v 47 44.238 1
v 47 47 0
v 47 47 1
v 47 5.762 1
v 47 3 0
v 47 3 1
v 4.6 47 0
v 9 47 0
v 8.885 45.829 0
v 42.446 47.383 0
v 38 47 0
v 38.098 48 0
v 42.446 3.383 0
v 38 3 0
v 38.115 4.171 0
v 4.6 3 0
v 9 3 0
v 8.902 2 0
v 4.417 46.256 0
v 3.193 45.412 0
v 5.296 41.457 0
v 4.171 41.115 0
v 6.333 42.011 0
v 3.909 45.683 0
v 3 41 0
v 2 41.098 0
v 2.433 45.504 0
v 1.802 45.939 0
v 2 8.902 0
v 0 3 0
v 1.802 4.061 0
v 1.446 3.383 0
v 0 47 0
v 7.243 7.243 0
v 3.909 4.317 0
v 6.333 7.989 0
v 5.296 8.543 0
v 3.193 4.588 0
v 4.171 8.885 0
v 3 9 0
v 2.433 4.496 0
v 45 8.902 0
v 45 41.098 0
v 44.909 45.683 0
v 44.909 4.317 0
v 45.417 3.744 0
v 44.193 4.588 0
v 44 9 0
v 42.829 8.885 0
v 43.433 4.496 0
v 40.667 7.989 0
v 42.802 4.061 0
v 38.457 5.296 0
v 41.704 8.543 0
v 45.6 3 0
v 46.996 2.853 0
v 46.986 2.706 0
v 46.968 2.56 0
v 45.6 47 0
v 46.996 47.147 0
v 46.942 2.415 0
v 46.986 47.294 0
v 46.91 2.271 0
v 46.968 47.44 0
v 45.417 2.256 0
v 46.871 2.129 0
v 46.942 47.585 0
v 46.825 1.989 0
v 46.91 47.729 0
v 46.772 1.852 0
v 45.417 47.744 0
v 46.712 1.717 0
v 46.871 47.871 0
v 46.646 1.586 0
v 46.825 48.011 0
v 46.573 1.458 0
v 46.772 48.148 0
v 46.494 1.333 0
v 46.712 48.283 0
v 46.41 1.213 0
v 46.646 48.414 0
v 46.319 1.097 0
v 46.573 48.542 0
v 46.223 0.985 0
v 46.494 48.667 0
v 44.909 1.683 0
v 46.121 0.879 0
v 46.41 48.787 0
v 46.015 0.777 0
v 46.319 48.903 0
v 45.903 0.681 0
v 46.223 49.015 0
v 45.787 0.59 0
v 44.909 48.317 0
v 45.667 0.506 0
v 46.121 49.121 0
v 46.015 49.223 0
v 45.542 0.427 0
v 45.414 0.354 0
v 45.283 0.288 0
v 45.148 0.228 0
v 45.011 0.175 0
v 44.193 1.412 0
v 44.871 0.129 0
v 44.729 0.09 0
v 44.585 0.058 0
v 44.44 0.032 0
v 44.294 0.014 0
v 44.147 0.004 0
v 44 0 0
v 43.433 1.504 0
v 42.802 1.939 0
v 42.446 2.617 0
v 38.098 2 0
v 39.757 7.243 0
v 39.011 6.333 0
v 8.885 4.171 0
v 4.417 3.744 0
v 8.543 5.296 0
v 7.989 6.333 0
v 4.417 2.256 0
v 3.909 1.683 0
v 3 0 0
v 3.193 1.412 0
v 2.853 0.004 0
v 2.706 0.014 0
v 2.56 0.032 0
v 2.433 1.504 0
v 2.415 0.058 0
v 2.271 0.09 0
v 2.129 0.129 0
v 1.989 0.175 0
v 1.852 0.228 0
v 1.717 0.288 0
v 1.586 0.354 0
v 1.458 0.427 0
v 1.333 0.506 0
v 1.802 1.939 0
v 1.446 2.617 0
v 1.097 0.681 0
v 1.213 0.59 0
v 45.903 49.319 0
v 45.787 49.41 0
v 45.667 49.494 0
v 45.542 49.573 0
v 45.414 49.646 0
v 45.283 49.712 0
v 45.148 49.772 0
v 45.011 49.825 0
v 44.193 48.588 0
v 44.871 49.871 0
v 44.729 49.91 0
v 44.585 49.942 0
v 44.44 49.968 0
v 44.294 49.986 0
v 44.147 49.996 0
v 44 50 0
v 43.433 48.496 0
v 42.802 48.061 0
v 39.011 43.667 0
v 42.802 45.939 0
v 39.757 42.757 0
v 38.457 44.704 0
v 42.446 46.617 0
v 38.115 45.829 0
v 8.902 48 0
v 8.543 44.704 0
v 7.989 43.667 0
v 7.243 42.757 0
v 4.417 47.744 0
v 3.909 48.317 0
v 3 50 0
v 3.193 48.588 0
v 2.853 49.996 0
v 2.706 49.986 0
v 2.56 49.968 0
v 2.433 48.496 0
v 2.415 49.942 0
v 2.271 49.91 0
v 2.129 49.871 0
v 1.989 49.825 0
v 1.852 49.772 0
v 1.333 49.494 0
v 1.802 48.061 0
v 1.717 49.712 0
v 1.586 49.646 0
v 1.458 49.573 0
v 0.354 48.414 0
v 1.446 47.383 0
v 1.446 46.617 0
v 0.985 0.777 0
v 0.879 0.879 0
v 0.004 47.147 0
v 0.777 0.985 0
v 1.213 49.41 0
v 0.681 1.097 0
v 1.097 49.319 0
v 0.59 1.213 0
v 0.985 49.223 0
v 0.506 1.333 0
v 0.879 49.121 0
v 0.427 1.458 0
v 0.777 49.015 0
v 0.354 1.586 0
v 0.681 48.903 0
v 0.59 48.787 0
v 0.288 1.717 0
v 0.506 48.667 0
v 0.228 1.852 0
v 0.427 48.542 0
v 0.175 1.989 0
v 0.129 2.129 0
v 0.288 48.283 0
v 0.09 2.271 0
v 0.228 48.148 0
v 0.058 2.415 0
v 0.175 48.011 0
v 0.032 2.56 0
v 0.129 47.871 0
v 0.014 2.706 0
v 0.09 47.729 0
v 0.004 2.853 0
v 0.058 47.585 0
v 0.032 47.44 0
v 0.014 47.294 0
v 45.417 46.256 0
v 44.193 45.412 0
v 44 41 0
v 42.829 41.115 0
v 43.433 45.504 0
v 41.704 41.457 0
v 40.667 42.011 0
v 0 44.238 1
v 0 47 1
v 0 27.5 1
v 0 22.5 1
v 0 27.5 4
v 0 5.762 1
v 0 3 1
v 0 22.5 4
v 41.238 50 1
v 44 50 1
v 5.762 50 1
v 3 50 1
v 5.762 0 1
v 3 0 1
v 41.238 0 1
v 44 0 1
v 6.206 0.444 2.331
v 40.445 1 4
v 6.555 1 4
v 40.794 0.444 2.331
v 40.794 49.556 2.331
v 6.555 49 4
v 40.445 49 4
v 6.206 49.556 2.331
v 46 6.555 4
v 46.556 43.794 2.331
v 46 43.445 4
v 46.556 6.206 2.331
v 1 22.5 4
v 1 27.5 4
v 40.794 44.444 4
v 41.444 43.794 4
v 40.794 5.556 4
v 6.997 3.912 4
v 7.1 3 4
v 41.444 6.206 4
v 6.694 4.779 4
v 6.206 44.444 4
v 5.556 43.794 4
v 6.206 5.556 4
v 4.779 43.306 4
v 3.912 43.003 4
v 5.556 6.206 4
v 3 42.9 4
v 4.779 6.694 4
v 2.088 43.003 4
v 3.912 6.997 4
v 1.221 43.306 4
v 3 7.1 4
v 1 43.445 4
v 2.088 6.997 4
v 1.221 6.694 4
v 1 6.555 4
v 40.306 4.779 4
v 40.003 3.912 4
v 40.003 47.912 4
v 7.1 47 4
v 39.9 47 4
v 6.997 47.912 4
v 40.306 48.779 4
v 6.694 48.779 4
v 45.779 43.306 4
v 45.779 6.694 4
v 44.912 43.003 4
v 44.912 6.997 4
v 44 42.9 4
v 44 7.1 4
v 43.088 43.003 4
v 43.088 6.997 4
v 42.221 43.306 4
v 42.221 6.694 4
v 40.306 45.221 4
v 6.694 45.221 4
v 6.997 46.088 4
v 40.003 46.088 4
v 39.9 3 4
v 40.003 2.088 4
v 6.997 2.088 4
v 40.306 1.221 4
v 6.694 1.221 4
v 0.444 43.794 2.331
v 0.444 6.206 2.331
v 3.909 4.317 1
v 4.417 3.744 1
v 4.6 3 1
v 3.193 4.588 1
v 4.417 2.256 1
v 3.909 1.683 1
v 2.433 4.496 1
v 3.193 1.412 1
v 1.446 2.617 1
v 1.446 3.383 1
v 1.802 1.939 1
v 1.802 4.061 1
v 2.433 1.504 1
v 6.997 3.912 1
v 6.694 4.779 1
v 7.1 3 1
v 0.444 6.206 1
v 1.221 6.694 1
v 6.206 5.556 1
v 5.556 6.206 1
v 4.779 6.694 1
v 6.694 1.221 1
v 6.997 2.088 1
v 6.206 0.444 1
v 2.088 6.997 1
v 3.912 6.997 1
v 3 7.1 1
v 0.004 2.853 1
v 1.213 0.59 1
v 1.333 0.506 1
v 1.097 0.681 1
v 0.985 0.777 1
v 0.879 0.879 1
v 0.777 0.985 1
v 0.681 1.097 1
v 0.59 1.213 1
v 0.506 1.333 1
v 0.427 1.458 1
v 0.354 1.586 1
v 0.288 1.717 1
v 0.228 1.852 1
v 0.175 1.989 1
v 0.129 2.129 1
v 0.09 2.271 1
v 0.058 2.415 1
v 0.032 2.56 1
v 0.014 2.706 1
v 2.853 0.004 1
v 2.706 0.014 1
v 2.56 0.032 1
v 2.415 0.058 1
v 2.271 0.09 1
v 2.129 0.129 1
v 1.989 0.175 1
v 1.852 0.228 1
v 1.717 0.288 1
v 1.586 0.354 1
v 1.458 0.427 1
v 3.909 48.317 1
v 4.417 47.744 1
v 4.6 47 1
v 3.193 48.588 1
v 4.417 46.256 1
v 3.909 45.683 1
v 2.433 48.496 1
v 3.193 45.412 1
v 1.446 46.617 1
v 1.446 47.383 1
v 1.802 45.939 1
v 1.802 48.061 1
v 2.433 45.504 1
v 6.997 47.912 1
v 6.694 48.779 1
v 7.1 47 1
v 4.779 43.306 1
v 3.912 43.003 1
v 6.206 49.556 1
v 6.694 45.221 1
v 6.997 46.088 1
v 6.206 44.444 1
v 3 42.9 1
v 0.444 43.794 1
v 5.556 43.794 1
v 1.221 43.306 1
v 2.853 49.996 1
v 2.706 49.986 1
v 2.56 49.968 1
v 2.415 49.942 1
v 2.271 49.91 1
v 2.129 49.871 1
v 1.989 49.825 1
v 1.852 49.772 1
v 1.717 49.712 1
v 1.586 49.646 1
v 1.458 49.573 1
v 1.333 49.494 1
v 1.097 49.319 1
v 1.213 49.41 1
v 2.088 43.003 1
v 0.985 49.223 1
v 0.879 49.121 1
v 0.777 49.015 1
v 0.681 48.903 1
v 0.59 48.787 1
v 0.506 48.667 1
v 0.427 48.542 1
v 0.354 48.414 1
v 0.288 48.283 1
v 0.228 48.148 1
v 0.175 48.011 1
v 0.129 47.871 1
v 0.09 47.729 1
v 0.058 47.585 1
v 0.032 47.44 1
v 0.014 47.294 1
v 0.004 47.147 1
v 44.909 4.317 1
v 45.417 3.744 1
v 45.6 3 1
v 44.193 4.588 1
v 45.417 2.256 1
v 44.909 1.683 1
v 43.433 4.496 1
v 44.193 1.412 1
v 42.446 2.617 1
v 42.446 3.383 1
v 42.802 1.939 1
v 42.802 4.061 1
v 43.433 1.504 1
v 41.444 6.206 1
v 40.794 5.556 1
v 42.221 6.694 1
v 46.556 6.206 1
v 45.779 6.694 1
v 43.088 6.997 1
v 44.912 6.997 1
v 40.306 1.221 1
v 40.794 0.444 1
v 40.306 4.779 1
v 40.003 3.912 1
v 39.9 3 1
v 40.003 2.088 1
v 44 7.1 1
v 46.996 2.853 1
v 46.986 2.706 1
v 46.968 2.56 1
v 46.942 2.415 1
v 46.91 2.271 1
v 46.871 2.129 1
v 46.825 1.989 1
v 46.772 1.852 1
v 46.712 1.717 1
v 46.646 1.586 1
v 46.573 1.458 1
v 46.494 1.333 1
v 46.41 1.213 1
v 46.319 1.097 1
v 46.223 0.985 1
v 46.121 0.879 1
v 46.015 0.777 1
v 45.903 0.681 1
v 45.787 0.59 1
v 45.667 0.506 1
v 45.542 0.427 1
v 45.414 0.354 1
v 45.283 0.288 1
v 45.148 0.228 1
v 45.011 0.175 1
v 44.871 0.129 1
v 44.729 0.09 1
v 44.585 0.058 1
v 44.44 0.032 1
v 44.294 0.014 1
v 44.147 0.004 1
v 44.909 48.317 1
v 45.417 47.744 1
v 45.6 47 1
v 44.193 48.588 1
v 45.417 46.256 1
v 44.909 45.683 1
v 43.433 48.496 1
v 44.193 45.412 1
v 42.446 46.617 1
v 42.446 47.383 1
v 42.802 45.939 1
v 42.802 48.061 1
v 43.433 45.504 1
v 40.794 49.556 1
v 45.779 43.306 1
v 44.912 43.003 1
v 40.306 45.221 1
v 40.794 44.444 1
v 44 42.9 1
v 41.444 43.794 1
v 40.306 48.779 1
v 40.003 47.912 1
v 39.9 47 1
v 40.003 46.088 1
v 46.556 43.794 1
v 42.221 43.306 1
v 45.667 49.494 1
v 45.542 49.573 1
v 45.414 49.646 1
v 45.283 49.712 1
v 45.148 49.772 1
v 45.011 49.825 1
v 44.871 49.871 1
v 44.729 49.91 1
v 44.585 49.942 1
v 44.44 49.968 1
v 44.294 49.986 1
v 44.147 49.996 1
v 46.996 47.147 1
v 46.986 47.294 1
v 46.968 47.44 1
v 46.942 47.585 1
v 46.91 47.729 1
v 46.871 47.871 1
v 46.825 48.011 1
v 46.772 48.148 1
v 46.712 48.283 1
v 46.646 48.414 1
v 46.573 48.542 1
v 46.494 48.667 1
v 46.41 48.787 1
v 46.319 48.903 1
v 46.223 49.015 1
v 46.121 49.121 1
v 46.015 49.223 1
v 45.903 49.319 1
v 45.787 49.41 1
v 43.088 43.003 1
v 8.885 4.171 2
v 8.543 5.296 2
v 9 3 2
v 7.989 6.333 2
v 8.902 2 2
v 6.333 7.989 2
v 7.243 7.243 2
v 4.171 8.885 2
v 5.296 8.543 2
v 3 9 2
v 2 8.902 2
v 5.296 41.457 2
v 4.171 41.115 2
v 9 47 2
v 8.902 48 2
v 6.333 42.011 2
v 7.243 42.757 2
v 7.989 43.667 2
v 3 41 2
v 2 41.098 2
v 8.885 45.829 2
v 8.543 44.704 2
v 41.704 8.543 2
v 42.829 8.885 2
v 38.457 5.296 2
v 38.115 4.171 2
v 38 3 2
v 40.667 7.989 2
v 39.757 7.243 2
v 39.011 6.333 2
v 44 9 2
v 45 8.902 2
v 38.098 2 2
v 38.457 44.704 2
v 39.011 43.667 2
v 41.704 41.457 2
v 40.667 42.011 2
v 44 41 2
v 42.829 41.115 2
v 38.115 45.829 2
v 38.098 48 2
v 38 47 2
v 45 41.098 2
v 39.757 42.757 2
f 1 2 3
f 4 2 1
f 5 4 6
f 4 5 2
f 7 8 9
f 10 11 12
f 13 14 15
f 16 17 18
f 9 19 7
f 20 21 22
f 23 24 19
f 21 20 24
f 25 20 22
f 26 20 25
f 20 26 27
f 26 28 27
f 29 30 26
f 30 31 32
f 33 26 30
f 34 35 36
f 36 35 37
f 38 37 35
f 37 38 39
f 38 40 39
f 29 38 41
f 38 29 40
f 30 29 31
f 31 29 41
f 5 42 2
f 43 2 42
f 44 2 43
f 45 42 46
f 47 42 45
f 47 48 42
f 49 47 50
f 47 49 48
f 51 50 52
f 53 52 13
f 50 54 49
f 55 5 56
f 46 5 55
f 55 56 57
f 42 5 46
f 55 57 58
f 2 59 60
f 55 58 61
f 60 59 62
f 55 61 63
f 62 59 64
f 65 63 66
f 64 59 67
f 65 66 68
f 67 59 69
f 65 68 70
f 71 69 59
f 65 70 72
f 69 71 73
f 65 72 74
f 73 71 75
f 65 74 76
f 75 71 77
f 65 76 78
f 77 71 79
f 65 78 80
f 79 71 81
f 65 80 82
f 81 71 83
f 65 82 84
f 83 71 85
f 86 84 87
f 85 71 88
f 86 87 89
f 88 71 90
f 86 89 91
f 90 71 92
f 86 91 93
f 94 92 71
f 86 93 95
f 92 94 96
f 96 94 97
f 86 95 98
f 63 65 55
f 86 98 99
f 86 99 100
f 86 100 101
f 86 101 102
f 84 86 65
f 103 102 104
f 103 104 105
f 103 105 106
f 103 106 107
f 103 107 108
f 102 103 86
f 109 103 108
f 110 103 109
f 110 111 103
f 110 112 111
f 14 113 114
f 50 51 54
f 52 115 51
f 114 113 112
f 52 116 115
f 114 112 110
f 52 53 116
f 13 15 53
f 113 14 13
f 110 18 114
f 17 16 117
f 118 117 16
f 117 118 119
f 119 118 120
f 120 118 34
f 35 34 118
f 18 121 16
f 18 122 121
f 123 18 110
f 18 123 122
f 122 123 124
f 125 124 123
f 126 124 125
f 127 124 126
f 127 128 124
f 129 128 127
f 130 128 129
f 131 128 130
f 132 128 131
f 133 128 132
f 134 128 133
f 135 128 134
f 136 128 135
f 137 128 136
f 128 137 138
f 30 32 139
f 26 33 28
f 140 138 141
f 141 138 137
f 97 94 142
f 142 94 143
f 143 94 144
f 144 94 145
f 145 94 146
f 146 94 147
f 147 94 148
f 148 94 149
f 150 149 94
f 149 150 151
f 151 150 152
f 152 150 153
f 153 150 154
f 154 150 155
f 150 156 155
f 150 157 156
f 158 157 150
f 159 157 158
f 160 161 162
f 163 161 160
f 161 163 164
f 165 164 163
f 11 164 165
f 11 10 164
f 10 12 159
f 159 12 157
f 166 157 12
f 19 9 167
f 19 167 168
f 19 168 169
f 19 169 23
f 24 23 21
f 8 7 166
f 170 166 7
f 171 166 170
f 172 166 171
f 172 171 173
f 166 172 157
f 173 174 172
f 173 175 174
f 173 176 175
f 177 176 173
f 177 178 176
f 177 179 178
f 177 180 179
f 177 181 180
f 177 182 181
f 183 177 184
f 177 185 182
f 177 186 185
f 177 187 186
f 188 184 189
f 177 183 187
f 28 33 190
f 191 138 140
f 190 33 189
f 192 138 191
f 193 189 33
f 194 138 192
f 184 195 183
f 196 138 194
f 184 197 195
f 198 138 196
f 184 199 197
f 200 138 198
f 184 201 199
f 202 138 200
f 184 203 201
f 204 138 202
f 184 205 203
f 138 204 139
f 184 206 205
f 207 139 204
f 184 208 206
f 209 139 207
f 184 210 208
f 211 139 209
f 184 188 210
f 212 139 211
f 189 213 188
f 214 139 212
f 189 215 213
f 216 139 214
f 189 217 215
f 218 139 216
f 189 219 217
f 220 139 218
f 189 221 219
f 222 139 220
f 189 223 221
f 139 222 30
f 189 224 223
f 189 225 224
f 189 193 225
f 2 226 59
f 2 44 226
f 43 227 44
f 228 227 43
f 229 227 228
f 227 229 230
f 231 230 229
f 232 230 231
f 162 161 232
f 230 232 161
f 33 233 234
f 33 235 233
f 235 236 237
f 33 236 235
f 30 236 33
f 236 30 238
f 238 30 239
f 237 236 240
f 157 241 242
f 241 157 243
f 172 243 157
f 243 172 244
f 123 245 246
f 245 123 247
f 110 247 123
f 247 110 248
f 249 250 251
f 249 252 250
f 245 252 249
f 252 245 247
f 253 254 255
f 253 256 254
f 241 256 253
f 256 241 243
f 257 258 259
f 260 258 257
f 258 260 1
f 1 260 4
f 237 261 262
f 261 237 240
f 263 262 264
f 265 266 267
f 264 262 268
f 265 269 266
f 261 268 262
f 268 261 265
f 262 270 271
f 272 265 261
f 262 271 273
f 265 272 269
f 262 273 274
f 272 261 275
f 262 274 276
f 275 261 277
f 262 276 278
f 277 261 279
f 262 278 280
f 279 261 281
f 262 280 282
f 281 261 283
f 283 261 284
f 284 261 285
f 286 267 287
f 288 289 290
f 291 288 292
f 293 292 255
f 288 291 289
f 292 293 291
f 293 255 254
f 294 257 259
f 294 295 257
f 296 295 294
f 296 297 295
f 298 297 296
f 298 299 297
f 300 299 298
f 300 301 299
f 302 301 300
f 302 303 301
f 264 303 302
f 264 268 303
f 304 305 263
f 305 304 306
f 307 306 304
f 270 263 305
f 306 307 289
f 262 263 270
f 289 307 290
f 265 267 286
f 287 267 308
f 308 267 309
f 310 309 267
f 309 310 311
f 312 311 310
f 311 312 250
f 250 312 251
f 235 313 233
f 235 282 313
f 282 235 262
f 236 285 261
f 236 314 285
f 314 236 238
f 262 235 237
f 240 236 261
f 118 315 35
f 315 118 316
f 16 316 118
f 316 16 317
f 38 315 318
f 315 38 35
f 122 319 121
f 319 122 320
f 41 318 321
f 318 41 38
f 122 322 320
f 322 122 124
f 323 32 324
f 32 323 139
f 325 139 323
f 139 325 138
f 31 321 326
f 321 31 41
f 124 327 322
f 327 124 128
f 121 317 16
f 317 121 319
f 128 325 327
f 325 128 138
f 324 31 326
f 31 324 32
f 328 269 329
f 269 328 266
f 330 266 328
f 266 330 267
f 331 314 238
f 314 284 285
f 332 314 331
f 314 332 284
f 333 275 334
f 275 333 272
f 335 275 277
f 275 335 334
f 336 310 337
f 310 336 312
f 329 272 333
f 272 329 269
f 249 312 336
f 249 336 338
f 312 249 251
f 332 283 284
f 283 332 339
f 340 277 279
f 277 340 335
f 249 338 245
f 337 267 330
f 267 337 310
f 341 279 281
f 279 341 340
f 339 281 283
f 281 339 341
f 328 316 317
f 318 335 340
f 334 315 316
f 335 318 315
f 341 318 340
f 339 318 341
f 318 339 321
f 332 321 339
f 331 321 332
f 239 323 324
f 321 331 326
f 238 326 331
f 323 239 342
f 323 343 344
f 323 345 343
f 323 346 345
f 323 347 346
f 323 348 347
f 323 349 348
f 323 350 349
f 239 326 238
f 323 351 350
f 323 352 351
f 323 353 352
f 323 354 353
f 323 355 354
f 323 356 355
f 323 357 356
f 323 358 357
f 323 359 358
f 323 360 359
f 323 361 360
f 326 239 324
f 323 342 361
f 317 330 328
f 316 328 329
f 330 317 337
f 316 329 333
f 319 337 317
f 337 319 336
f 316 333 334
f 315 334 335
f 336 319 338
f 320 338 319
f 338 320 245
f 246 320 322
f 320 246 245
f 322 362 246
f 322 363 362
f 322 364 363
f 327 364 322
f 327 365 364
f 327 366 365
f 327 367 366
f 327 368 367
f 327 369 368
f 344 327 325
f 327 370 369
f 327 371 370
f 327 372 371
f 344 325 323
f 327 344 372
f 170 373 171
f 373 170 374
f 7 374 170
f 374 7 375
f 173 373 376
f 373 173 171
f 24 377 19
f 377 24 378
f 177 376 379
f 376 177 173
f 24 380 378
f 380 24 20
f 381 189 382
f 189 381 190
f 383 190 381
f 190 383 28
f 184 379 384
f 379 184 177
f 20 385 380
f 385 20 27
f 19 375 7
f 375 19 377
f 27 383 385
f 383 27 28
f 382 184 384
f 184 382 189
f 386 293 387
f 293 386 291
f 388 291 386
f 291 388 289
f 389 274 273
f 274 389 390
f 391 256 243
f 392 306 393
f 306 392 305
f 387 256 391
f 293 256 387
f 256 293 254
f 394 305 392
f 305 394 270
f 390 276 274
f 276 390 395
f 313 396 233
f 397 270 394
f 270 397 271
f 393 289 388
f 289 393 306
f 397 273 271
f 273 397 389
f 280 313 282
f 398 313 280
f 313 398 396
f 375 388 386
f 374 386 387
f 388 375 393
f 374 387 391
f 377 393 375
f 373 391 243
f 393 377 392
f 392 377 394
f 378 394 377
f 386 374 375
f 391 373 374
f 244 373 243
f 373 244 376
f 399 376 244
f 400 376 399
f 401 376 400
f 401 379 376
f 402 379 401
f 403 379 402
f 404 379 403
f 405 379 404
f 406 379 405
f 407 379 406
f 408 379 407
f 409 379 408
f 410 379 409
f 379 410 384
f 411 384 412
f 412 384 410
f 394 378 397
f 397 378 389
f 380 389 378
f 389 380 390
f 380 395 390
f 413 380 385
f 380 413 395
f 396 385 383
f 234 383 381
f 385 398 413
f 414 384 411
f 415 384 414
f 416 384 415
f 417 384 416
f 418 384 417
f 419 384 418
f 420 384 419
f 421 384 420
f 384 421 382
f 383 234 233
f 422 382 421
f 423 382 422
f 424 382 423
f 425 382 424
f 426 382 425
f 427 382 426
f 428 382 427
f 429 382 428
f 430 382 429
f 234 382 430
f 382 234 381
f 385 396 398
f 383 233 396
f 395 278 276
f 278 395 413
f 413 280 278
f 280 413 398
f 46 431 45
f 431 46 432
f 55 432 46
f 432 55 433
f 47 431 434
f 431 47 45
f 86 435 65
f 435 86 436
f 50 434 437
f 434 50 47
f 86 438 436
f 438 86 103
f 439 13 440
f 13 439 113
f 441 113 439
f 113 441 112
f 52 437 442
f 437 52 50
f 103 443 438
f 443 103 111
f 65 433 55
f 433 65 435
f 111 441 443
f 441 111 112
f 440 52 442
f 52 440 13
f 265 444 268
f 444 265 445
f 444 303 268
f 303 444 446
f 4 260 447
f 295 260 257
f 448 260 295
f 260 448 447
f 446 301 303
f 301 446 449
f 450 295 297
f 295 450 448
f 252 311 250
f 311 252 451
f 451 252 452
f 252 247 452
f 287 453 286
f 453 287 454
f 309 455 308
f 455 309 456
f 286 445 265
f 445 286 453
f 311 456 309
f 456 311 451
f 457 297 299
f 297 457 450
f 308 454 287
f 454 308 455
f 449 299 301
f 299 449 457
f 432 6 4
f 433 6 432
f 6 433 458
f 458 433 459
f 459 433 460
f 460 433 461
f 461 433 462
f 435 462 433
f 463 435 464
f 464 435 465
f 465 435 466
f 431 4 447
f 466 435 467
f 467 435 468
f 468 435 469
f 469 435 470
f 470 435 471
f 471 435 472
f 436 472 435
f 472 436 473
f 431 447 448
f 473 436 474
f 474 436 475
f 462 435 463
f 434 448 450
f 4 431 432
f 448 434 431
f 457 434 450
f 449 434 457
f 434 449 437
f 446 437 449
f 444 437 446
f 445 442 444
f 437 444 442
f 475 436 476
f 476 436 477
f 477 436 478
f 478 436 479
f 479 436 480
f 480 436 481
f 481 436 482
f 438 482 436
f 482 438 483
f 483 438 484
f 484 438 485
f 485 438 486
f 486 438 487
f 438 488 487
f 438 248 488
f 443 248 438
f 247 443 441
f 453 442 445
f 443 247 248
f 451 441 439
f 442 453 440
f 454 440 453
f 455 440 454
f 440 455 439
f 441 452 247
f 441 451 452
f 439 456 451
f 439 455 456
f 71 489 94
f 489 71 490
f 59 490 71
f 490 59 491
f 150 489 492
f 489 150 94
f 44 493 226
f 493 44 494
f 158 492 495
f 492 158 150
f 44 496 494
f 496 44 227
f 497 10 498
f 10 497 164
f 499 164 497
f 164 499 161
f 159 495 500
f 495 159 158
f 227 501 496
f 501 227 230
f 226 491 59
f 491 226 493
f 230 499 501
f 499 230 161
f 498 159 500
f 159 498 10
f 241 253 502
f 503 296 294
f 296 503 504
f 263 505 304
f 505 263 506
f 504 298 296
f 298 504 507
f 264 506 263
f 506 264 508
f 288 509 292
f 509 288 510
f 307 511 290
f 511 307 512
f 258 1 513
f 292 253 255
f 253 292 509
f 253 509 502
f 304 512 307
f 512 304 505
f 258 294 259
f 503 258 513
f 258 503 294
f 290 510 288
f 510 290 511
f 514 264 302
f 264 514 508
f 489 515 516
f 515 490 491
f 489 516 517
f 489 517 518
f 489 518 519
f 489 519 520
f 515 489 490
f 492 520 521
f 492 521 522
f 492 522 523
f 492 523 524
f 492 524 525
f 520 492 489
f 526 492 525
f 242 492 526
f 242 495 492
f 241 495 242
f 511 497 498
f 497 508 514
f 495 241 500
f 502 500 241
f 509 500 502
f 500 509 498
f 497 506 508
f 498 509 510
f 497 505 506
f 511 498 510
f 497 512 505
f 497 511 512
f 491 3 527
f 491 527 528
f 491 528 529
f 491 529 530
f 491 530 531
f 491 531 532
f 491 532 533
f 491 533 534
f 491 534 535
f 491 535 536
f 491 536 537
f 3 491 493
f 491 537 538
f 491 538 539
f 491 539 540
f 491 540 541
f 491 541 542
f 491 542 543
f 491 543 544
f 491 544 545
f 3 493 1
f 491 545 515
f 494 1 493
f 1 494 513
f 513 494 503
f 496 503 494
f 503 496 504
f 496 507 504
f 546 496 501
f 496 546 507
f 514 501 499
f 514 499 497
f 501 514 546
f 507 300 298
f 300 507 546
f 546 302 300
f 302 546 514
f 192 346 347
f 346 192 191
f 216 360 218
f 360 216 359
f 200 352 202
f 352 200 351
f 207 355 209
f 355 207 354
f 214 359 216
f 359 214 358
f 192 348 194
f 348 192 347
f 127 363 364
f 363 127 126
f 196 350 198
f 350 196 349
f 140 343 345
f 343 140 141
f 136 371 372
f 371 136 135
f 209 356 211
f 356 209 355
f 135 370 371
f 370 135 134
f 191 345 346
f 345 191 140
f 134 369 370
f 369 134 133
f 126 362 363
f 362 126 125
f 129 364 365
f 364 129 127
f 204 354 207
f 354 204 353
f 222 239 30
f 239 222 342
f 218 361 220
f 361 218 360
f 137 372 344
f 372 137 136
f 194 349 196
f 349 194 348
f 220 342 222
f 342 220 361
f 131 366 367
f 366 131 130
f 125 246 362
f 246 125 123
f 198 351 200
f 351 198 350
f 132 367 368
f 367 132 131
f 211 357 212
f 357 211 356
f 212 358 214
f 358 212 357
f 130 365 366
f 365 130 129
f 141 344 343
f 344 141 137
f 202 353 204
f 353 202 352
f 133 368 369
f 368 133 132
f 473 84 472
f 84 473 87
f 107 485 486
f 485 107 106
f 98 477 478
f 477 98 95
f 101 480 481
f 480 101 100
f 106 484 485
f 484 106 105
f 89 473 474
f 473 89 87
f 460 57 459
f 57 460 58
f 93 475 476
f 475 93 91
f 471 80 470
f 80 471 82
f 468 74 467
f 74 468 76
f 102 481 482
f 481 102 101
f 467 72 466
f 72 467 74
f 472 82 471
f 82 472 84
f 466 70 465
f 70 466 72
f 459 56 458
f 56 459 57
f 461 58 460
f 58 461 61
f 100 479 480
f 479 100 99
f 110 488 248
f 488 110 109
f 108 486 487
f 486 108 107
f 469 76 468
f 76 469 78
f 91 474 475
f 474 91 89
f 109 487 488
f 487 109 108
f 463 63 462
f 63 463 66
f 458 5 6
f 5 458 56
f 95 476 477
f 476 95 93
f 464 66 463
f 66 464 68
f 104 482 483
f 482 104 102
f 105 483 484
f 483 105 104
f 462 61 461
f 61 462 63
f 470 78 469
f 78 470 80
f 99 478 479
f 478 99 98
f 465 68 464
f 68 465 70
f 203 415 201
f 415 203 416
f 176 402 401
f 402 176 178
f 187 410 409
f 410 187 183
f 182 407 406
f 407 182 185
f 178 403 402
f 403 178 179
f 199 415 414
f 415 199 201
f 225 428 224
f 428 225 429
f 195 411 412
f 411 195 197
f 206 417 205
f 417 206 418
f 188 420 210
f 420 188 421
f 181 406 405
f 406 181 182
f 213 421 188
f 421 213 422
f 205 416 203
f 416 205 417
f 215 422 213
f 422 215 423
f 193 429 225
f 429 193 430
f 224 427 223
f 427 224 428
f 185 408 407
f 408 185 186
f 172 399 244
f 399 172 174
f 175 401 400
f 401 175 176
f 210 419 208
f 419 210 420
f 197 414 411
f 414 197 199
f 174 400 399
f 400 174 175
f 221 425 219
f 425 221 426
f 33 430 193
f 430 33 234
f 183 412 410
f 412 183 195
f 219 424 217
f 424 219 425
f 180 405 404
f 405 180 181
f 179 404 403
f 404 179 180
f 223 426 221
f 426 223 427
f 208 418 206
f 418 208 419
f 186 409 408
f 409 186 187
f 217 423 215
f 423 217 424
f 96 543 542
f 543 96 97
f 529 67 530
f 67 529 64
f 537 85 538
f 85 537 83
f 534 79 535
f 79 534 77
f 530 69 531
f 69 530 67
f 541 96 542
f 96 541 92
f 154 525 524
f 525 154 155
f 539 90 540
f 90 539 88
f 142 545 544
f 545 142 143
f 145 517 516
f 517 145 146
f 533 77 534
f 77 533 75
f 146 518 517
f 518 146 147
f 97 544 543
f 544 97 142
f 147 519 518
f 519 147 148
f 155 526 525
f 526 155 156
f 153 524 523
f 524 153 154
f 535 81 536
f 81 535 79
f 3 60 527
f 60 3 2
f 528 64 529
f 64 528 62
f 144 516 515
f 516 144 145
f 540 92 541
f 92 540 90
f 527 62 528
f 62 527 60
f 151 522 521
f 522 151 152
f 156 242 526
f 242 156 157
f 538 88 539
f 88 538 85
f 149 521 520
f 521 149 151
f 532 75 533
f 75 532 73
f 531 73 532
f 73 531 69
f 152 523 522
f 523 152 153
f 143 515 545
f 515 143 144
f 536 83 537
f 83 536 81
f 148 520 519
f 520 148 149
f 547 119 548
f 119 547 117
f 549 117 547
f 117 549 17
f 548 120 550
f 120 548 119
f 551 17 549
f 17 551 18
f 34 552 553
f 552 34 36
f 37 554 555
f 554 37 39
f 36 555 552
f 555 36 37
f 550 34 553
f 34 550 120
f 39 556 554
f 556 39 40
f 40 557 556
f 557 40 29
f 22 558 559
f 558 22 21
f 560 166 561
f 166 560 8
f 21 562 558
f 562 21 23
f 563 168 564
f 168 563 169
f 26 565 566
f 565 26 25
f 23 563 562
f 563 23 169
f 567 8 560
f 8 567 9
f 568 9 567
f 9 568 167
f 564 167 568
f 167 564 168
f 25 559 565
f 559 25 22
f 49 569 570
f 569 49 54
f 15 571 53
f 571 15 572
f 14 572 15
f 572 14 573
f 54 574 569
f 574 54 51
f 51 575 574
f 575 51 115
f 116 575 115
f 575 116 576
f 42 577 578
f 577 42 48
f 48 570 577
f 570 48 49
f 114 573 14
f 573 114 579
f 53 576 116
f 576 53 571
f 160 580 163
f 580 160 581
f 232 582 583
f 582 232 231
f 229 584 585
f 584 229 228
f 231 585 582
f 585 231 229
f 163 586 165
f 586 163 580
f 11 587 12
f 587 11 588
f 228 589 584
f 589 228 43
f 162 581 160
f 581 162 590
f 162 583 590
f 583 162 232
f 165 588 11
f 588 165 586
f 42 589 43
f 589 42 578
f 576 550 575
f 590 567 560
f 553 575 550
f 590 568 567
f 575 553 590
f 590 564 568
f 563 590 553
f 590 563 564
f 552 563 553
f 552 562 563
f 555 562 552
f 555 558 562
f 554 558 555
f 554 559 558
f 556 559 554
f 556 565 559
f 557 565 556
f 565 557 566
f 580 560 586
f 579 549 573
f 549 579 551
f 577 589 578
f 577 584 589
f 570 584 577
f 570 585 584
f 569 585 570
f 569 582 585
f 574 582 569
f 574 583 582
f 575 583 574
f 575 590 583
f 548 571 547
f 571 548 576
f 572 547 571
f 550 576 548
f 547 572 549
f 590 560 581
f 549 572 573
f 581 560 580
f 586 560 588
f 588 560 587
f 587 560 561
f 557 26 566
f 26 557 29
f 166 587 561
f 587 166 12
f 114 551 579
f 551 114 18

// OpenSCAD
// file: lib/utils.scad
module clearance_hole(d, h=100, clearance=0.2, e=0.1) {
	cylinder(r=(d+clearance)/2, h=h+e, $fn=min(64, 4 + 3*d));
}

module z_fillet(r=5, h=100, e=0.1) {
	difference() {
	translate([0-e, 0-e, 0])
		cube([r+e, r+e, h]);
	translate([r, r, 0-e])
		cylinder(r=r, h=h+e+e, $fn=$fn*4);
	}
}

module hexagonal_prism(d_flat=8, h=10) {
    r = d_flat / sqrt(3); // Circumradius
    cylinder(h=h, r=r, $fn=6);
}

module grip_texture(length, depth, height) {
	n = floor(length/depth); // TODO: number of teeth
	e = 0.1;
	xOffset = (length - depth*n)/2;
	difference() {
		translate([0, 0-e, 0-e])
		cube([length, depth+e, height+e+e]);
		for (i = [0:n]) {
			translate([i*depth*2 - xOffset, depth, 0-e])
			cylinder(r=depth, h=height+e+e, $fn=4);
		}
	}
}

module lanyard_loop(length=30, width=8, height=10, overflow=0, slotDiameter=5) {
	e=0.1;
	wall = (height - slotDiameter)/2;
	assert(wall > 0, "slotDiameter too large for lanyard loop");
	difference() {
		union() {
			translate([0-overflow, 0, 0])
			cube([height+overflow, length, width]);
			translate([0, length, 0])
				z_fillet(height/2, h=width);
		}
		translate([height, 0, 0-e])
		rotate([0, 0, 90])
		z_fillet(height/2);
		translate([height, length, 0-e])
		rotate([0, 0, 180])
		z_fillet(height/2);

		// slot
		slotLength = length - wall*3 - slotDiameter;
		translate([wall, wall, 0-e])
			round_rect(size=[slotDiameter, slotLength, width+e+e], r=slotDiameter/2);
		translate([height/2, length - slotDiameter/2 - wall, 0-e])
		cylinder(r=slotDiameter/2, h=width+e+e);
	}
}

module round_rect(size=[10, 10, 10], r=1) {
	difference() {
		cube(size);
		if (r > 0) {
			for (i = [[0,0,0], [1,0,90], [1,1,180], [0,1,270]]) {
				translate([i[0]*size[0], i[1]*size[1], -.1])
				rotate([0, 0, i[2]])
					z_fillet(r, h=size[2]+0.2);
			}
		}
	}
}

function mounting_bolts(length, width, holeOffset) = [
	[ holeOffset, holeOffset],
	[ holeOffset, width - holeOffset],
	[ length - holeOffset, holeOffset],
	[ length - holeOffset, width - holeOffset]
];

function hexWrenchSize(width) = width / 2 * sqrt(3);
// main file
use <lib/utils.scad>;

module case_cover(
	length=47,
	width=50,
	thickness=4,
	hex=false,
	counterboreDepth=3,
	counterboreDiameter=8) {

	bottomThickness = 1;
	topThickness = 2;
	mountHoleOffset = 3; // must match the value in case_frame
	mountHoleSize = 3;
	draftOffset = 1;
	wallThickness = 2;
	wrenchSize = hexWrenchSize(counterboreDiameter);
	echo("Counterbore size: ", counterboreDiameter, "\n");
	echo("Wrench size: ", wrenchSize, "\n");
	e = 0.1; // small waste number; not for final geometry

	assert(thickness >= (counterboreDepth+bottomThickness), "case_cover thickness is too small");

	difference() {
		union() {
			cube([
				length,
				width,
				bottomThickness
			]);
			translate([0, 0, bottomThickness])
				truncated_pyramid(length=length, width=width, height=thickness-bottomThickness, inset=draftOffset);

			// Feet - for stability
			footWidth = 5;
			translate([0, (width - footWidth)/2, 0])
				cube([ length/2, footWidth, thickness]);

		}

		for (
			position = mounting_bolts(length, width, mountHoleOffset)
		) {
			translate([position[0], position[1], 0]) {
				clearance_hole(mountHoleSize);
				translate([0,0, thickness - counterboreDepth])
				if (hex) {
					cylinder(r=counterboreDiameter/2, h=counterboreDepth+e+e, $fn=6);
				} else {
					clearance_hole(counterboreDiameter, counterboreDepth+e);
				}
			}
		}

		// Remove corner material if hex
		if (hex) {
			positions = mounting_bolts(length, width, mountHoleOffset);
			hexCornerDifference( // bottom-right
				position=positions[0],
				angle=-120,
				width=wrenchSize,
				depth=counterboreDepth,
				thickness=thickness
			);
			hexCornerDifference( // bottom-left
				position=positions[1],
				angle=120,
				width=wrenchSize,
				depth=counterboreDepth,
				thickness=thickness
			);
			hexCornerDifference( // top-right
				position=positions[2],
				angle=300,
				width=wrenchSize,
				depth=counterboreDepth,
				thickness=thickness
			);
			hexCornerDifference( // top-left
				position=positions[3],
				angle=60,
				width=wrenchSize,
				depth=counterboreDepth,
				thickness=thickness
			);
		}

		// Corner Radiuses
		translate([0, 0, 0-e])          rotate([0, 0, 0])    z_fillet(3);
		translate([length, 0, 0-e])     rotate([0, 0, 90])   z_fillet(3);
		translate([0, width, 0-e])      rotate([0, 0, 270])  z_fillet(3);
		translate([length, width, 0-e]) rotate([0, 0, 180])  z_fillet(3);

		// Inner cavity
		difference() {
			translate([
				wallThickness,
				wallThickness,
				0-e
			])
			cube([
				length - 2*wallThickness,
				width - 2*wallThickness,
				thickness - topThickness + e
			]);

			for (position = mounting_bolts(length, width, mountHoleOffset)) {
				translate([position[0], position[1], 0-e]) {
					innerCavityRadius = max((counterboreDiameter/2)+topThickness,wallThickness);
					cylinder(r=innerCavityRadius, h=thickness-topThickness+e+e);
				}
			}
		}
	}

}

module hexCornerDifference(
	position,
	angle,
	width,
	depth,
	thickness
) {
	length=100; // any long enough number
	translate([position[0], position[1], 0])
	rotate([0,0,angle])
	translate([0, 0-width/2, thickness-depth])
		cube([length, width, depth]);
}

module truncated_pyramid(length, width, height, inset=5) {
	polyhedron(
		points=[
			[0      , 0     , 0]      , // 0
			[length , 0     , 0]      , // 1
			[length , width , 0]      , // 2
			[0      , width , 0]      , // 3

			[inset        , inset       , height] , // 4
			[length-inset , inset       , height] , // 5
			[length-inset , width-inset , height] , // 6
			[inset        , width-inset , height] , // 7
		],
		faces=[
			[1, 0, 4],
			[4, 5, 1],
			[2, 1, 5],
			[5, 6, 2],
			[3, 2, 6],
			[6, 7, 3],
			[0, 3, 7],
			[7, 4, 0],
			[7, 6, 5],
			[4, 7, 5],
			[0, 1, 3],
			[1, 2, 3],
		],
		convexity=1
	);
}

case_cover($fn=32);
